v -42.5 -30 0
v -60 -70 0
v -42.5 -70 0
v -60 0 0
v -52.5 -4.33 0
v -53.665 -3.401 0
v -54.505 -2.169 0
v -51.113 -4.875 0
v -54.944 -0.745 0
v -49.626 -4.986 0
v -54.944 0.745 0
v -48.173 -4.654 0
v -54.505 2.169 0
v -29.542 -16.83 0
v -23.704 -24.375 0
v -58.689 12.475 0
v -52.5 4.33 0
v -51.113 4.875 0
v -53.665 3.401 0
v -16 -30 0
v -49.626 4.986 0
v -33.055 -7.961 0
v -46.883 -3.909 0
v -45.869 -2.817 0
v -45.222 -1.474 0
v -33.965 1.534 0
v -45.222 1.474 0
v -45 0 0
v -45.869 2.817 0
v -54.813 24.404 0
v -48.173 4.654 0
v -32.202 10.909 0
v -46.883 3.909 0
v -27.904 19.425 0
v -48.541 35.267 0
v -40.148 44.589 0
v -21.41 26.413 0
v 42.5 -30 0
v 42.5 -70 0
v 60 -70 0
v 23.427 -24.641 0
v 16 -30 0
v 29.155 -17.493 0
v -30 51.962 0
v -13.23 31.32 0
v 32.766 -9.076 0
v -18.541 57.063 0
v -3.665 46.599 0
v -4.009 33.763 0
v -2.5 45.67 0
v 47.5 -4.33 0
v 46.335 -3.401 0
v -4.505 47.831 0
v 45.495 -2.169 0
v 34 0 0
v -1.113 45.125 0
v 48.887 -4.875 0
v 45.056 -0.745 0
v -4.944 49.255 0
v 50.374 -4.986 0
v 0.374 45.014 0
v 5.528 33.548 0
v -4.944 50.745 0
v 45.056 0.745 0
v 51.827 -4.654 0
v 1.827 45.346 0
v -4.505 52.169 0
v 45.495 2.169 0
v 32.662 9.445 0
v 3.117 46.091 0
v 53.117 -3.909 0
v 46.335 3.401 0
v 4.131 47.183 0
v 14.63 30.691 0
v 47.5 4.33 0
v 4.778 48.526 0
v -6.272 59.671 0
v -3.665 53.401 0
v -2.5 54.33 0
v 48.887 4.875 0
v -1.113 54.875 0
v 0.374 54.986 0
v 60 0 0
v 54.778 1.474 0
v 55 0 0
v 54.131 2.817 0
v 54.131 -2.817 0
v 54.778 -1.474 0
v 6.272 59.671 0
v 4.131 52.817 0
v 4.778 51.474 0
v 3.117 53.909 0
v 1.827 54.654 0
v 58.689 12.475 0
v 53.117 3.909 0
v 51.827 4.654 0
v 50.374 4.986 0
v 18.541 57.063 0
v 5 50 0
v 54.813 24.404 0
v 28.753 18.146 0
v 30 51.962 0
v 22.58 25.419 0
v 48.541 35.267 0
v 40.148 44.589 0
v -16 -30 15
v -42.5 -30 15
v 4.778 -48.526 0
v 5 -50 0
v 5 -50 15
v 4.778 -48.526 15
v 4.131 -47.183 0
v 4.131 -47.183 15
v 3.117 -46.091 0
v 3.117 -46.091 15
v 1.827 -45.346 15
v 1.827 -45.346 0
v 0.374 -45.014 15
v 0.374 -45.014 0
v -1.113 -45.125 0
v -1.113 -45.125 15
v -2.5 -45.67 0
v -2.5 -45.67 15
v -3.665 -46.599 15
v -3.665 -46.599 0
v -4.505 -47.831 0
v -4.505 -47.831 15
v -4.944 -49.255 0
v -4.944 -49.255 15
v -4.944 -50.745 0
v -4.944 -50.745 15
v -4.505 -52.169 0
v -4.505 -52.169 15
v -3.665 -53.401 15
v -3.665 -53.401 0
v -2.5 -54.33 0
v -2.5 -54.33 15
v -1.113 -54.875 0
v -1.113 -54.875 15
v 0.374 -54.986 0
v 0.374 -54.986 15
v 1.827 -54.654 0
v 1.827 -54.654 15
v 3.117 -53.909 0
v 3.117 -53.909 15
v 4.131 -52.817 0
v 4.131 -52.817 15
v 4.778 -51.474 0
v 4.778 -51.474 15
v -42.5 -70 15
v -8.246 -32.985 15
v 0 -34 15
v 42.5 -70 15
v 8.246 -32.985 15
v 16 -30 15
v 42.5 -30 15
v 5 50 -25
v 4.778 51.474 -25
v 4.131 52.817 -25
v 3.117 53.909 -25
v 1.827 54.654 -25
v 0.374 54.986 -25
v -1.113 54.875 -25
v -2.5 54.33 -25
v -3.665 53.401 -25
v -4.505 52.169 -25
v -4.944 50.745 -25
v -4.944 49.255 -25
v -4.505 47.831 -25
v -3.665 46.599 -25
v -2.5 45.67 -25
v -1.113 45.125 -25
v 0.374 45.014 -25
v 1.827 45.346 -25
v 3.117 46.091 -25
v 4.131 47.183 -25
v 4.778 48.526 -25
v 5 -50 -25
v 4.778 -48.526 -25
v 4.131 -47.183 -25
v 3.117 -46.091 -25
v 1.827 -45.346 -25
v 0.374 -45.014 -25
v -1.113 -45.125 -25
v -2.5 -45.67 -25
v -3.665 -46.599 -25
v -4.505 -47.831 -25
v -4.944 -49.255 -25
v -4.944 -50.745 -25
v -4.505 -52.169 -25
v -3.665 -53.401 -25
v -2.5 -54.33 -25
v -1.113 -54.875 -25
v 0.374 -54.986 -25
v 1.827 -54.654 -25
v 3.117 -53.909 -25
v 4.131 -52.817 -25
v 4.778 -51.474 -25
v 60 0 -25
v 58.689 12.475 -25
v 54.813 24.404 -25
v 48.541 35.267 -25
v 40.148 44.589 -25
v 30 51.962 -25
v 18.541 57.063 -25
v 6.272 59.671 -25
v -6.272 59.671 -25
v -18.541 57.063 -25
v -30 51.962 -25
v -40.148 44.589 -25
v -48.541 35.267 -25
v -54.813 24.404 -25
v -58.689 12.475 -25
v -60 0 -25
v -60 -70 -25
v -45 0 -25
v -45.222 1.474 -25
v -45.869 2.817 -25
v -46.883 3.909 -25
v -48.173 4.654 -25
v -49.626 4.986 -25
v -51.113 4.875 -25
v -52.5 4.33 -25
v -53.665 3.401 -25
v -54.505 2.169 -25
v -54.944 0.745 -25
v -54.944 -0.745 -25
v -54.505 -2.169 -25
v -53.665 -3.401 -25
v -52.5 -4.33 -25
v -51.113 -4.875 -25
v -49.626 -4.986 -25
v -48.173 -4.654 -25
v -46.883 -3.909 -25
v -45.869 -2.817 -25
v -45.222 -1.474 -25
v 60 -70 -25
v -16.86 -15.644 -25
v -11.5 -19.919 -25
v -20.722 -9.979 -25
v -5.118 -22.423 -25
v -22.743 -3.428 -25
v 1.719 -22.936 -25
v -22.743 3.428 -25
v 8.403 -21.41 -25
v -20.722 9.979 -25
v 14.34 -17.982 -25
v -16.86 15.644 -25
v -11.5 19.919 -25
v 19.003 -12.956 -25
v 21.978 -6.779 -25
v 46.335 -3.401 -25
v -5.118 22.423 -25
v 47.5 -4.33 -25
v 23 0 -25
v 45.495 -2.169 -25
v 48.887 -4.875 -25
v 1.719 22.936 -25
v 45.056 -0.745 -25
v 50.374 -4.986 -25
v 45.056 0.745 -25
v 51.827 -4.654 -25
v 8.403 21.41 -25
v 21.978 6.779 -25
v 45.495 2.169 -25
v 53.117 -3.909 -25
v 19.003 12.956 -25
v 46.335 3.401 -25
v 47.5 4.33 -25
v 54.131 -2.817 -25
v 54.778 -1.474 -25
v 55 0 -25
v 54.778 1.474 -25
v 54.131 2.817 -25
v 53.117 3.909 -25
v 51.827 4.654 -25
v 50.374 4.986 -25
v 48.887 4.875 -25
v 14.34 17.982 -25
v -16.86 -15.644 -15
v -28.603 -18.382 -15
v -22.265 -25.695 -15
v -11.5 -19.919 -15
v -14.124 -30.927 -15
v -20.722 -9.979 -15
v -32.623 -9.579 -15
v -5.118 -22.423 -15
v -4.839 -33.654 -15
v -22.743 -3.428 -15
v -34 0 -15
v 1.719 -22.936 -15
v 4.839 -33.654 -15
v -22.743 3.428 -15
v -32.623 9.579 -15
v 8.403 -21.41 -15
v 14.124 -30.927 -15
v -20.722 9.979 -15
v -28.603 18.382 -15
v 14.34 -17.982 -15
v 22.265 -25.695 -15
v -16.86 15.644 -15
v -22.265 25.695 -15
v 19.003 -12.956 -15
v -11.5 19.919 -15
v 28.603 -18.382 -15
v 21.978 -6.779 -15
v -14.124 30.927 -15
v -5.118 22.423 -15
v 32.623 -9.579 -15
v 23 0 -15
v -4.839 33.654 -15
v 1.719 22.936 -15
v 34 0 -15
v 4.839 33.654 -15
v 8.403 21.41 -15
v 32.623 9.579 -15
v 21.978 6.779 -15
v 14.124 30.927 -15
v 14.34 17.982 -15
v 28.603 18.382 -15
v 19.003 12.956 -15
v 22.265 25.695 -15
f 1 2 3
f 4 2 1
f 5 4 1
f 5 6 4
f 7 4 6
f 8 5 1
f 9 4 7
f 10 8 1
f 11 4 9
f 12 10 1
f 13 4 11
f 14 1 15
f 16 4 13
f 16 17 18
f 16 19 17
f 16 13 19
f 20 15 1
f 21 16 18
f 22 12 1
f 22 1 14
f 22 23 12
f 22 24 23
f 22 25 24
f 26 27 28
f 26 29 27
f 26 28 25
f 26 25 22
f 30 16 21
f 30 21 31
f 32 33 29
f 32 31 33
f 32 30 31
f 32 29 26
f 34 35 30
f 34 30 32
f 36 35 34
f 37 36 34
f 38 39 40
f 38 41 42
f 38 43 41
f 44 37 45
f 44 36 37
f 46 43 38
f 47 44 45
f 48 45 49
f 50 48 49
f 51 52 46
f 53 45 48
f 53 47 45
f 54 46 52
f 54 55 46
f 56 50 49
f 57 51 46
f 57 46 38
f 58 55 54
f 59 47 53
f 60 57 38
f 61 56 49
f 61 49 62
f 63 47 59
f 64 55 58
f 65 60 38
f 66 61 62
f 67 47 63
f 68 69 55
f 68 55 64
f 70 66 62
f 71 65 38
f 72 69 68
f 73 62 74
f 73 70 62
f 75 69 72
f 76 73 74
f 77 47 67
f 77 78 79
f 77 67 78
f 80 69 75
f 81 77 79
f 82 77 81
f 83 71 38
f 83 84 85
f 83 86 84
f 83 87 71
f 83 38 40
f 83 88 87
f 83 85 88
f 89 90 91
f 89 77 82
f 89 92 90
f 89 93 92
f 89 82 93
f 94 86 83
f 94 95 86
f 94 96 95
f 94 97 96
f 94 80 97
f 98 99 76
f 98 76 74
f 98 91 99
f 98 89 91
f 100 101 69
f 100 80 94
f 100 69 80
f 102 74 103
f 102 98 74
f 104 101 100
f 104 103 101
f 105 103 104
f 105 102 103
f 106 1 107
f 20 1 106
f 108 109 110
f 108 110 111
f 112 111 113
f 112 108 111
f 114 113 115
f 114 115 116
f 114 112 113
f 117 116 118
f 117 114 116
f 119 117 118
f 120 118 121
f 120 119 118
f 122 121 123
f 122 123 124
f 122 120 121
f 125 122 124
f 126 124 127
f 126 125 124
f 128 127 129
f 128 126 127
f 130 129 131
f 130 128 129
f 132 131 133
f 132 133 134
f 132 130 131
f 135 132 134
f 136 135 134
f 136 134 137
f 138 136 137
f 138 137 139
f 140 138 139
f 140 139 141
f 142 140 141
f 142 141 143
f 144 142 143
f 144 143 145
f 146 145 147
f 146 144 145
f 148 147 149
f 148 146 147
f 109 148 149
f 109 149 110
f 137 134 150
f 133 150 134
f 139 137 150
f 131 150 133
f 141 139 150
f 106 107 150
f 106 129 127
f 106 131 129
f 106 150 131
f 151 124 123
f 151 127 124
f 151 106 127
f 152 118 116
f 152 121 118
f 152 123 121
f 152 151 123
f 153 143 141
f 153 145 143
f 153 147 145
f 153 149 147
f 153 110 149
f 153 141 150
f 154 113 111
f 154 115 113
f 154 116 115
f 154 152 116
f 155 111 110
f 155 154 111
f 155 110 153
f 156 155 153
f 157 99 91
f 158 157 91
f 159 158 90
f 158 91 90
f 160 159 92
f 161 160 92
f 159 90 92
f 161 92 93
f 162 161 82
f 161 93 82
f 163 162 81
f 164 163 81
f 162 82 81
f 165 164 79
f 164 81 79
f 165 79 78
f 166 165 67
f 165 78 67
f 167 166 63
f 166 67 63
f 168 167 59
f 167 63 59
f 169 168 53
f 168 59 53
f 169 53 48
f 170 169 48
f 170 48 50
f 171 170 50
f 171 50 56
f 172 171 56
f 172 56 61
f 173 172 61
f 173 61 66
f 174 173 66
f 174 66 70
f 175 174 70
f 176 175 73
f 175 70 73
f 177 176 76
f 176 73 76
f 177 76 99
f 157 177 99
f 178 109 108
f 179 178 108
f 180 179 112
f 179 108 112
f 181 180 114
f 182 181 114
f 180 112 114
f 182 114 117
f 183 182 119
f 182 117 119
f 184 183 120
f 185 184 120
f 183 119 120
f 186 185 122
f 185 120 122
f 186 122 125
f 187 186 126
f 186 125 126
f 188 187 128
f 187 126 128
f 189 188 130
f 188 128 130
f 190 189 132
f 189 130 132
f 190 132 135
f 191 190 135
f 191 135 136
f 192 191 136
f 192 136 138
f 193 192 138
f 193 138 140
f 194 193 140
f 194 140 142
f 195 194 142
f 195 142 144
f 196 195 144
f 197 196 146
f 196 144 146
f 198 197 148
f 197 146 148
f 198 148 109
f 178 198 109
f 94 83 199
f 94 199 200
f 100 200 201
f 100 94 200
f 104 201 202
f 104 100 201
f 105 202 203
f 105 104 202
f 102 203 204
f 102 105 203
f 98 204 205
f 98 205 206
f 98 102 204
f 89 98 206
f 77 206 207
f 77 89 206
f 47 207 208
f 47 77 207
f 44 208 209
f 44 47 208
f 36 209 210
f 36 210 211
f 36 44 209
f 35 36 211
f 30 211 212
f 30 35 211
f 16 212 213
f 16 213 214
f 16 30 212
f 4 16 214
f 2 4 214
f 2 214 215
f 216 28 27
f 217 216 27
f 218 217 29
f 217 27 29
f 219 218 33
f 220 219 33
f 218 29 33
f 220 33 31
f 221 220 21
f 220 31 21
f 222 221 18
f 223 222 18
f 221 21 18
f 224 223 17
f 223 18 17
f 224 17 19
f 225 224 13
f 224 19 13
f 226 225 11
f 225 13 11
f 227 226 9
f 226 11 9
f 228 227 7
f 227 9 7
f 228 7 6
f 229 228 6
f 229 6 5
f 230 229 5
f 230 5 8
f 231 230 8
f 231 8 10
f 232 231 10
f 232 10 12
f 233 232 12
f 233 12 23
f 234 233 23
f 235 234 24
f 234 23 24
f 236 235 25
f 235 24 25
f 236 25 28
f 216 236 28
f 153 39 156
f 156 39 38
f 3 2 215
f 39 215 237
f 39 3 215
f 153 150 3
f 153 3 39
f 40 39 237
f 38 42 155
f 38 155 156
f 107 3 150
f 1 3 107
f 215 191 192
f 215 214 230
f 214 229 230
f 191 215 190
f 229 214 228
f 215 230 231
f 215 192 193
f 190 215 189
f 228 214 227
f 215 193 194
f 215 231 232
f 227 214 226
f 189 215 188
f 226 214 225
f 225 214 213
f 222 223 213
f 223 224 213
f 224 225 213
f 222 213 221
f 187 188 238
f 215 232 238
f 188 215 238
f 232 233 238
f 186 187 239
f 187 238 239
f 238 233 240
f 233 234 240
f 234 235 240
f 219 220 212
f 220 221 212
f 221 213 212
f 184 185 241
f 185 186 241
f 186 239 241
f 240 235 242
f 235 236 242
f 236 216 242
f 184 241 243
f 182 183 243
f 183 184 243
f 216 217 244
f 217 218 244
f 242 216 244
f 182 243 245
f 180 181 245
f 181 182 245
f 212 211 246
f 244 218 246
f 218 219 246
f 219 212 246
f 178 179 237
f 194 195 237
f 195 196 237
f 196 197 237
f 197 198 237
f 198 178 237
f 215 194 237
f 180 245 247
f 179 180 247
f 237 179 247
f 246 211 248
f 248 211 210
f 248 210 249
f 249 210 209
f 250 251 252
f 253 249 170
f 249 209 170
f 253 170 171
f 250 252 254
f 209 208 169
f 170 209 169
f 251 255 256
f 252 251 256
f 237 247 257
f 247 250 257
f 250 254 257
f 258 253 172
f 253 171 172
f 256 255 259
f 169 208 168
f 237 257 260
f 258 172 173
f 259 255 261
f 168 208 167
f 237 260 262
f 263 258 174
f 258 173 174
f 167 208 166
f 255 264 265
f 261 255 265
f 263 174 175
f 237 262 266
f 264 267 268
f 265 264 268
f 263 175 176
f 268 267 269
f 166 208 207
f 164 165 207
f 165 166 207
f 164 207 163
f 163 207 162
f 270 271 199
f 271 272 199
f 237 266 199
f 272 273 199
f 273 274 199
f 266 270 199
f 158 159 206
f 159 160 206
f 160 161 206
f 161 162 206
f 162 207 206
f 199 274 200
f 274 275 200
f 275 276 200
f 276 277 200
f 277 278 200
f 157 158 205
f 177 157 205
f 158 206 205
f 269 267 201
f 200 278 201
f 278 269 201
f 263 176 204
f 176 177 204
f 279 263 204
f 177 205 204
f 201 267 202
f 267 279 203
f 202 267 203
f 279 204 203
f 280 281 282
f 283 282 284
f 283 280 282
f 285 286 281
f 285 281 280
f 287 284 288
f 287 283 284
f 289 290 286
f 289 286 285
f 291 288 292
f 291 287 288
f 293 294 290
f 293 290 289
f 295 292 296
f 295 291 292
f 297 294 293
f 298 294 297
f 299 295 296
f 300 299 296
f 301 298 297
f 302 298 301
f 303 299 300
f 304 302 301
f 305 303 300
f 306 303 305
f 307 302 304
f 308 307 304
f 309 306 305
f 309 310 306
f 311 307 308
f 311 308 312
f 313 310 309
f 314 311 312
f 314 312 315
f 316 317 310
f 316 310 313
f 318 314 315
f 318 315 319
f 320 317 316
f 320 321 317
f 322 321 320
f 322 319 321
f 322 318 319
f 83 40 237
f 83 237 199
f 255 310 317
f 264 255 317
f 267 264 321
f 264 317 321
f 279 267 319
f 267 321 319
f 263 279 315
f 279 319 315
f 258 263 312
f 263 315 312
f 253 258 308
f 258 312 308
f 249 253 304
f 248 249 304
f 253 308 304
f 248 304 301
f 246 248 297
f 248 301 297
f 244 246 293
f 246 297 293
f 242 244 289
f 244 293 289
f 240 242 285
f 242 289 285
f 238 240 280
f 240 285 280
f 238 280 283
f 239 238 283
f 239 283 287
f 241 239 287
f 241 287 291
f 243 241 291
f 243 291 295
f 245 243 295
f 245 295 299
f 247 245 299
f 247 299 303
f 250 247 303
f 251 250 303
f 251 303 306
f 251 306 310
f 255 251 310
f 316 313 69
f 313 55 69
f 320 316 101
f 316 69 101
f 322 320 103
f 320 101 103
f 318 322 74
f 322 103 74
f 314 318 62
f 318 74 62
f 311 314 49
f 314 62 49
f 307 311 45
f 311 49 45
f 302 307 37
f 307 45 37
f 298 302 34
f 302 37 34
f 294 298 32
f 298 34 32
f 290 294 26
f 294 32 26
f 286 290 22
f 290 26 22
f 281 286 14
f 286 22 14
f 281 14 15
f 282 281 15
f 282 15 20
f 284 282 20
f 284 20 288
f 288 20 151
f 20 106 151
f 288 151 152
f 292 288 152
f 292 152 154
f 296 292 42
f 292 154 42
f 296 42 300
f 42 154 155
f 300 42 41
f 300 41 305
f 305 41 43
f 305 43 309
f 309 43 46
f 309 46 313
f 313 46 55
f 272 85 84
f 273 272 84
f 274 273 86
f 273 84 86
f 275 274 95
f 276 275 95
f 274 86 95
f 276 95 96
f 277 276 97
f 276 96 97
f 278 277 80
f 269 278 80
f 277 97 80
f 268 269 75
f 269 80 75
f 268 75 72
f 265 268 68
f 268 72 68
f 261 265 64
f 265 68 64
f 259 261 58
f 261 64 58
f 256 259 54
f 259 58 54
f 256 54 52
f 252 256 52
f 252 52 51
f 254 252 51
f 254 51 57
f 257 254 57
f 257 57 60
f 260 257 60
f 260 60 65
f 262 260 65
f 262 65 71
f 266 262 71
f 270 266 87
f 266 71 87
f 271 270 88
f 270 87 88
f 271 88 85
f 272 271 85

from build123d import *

# Parameters (mm, degrees)
F1_DEPTH      = 25
F2_W          = 85
F2_H          = 40
F3_DEPTH      = 15
F4_R          = 5
F5_DEPTH      = 15
F5_DEPTH_BACK = 25
F6_R          = 34
F7_DEPTH      = 15
F7_DEPTH_BACK = 15
F8_R          = 23
F9_DEPTH      = 25
F10_R         = 5
F11_DEPTH     = 25


with BuildPart() as f1:
    # F0 (on Top) → F1 (new body)
    with BuildSketch(Plane.XY):
        with BuildLine():
            Line((60, -70), (60, 0))
            ThreePointArc((60, 0), (0, -60), (-60, 0))
            Line((-60, 0), (-60, -70))
            Line((-60, -70), (60, -70))
        make_face()
        with BuildLine():
            ThreePointArc((-60, 0), (0, -60), (60, 0))
            Line((60, 0), (-60, 0))
        make_face()
        with BuildLine():
            Line((-60, 0), (60, 0))
            ThreePointArc((60, 0), (0, 60), (-60, 0))
        make_face()
    extrude(amount=-F1_DEPTH)

    # F2 (on Top) → F3 (join)
    with BuildSketch(Plane.XY):
        with Locations((0, -50)):
            Rectangle(F2_W, F2_H)
    extrude(amount=F3_DEPTH)

    # F4 (on Top) → F5 (cut, two sides)
    with BuildSketch(Plane.XY) as f5_sk:
        with Locations((0, -50)):
            Circle(F4_R)
    extrude(amount=F5_DEPTH, mode=Mode.SUBTRACT)
    extrude(f5_sk.sketch, amount=-F5_DEPTH_BACK, mode=Mode.SUBTRACT)

    # F6 (on Top) → F7 (cut, two sides)
    with BuildSketch(Plane.XY) as f7_sk:
        Circle(F6_R)
    extrude(amount=-F7_DEPTH, mode=Mode.SUBTRACT)
    extrude(f7_sk.sketch, amount=F7_DEPTH_BACK, mode=Mode.SUBTRACT)

    # F8 (on Top) → F9 (cut)
    with BuildSketch(Plane.XY):
        Circle(F8_R)
    extrude(amount=-F9_DEPTH, mode=Mode.SUBTRACT)

    # F10 (on Top) → F11 (cut)
    with BuildSketch(Plane.XY):
        with Locations((-50, 0)):
            Circle(F10_R)
        with Locations((0, 50)):
            Circle(F10_R)
        with Locations((50, 0)):
            Circle(F10_R)
    extrude(amount=-F11_DEPTH, mode=Mode.SUBTRACT)


solid = f1.part
